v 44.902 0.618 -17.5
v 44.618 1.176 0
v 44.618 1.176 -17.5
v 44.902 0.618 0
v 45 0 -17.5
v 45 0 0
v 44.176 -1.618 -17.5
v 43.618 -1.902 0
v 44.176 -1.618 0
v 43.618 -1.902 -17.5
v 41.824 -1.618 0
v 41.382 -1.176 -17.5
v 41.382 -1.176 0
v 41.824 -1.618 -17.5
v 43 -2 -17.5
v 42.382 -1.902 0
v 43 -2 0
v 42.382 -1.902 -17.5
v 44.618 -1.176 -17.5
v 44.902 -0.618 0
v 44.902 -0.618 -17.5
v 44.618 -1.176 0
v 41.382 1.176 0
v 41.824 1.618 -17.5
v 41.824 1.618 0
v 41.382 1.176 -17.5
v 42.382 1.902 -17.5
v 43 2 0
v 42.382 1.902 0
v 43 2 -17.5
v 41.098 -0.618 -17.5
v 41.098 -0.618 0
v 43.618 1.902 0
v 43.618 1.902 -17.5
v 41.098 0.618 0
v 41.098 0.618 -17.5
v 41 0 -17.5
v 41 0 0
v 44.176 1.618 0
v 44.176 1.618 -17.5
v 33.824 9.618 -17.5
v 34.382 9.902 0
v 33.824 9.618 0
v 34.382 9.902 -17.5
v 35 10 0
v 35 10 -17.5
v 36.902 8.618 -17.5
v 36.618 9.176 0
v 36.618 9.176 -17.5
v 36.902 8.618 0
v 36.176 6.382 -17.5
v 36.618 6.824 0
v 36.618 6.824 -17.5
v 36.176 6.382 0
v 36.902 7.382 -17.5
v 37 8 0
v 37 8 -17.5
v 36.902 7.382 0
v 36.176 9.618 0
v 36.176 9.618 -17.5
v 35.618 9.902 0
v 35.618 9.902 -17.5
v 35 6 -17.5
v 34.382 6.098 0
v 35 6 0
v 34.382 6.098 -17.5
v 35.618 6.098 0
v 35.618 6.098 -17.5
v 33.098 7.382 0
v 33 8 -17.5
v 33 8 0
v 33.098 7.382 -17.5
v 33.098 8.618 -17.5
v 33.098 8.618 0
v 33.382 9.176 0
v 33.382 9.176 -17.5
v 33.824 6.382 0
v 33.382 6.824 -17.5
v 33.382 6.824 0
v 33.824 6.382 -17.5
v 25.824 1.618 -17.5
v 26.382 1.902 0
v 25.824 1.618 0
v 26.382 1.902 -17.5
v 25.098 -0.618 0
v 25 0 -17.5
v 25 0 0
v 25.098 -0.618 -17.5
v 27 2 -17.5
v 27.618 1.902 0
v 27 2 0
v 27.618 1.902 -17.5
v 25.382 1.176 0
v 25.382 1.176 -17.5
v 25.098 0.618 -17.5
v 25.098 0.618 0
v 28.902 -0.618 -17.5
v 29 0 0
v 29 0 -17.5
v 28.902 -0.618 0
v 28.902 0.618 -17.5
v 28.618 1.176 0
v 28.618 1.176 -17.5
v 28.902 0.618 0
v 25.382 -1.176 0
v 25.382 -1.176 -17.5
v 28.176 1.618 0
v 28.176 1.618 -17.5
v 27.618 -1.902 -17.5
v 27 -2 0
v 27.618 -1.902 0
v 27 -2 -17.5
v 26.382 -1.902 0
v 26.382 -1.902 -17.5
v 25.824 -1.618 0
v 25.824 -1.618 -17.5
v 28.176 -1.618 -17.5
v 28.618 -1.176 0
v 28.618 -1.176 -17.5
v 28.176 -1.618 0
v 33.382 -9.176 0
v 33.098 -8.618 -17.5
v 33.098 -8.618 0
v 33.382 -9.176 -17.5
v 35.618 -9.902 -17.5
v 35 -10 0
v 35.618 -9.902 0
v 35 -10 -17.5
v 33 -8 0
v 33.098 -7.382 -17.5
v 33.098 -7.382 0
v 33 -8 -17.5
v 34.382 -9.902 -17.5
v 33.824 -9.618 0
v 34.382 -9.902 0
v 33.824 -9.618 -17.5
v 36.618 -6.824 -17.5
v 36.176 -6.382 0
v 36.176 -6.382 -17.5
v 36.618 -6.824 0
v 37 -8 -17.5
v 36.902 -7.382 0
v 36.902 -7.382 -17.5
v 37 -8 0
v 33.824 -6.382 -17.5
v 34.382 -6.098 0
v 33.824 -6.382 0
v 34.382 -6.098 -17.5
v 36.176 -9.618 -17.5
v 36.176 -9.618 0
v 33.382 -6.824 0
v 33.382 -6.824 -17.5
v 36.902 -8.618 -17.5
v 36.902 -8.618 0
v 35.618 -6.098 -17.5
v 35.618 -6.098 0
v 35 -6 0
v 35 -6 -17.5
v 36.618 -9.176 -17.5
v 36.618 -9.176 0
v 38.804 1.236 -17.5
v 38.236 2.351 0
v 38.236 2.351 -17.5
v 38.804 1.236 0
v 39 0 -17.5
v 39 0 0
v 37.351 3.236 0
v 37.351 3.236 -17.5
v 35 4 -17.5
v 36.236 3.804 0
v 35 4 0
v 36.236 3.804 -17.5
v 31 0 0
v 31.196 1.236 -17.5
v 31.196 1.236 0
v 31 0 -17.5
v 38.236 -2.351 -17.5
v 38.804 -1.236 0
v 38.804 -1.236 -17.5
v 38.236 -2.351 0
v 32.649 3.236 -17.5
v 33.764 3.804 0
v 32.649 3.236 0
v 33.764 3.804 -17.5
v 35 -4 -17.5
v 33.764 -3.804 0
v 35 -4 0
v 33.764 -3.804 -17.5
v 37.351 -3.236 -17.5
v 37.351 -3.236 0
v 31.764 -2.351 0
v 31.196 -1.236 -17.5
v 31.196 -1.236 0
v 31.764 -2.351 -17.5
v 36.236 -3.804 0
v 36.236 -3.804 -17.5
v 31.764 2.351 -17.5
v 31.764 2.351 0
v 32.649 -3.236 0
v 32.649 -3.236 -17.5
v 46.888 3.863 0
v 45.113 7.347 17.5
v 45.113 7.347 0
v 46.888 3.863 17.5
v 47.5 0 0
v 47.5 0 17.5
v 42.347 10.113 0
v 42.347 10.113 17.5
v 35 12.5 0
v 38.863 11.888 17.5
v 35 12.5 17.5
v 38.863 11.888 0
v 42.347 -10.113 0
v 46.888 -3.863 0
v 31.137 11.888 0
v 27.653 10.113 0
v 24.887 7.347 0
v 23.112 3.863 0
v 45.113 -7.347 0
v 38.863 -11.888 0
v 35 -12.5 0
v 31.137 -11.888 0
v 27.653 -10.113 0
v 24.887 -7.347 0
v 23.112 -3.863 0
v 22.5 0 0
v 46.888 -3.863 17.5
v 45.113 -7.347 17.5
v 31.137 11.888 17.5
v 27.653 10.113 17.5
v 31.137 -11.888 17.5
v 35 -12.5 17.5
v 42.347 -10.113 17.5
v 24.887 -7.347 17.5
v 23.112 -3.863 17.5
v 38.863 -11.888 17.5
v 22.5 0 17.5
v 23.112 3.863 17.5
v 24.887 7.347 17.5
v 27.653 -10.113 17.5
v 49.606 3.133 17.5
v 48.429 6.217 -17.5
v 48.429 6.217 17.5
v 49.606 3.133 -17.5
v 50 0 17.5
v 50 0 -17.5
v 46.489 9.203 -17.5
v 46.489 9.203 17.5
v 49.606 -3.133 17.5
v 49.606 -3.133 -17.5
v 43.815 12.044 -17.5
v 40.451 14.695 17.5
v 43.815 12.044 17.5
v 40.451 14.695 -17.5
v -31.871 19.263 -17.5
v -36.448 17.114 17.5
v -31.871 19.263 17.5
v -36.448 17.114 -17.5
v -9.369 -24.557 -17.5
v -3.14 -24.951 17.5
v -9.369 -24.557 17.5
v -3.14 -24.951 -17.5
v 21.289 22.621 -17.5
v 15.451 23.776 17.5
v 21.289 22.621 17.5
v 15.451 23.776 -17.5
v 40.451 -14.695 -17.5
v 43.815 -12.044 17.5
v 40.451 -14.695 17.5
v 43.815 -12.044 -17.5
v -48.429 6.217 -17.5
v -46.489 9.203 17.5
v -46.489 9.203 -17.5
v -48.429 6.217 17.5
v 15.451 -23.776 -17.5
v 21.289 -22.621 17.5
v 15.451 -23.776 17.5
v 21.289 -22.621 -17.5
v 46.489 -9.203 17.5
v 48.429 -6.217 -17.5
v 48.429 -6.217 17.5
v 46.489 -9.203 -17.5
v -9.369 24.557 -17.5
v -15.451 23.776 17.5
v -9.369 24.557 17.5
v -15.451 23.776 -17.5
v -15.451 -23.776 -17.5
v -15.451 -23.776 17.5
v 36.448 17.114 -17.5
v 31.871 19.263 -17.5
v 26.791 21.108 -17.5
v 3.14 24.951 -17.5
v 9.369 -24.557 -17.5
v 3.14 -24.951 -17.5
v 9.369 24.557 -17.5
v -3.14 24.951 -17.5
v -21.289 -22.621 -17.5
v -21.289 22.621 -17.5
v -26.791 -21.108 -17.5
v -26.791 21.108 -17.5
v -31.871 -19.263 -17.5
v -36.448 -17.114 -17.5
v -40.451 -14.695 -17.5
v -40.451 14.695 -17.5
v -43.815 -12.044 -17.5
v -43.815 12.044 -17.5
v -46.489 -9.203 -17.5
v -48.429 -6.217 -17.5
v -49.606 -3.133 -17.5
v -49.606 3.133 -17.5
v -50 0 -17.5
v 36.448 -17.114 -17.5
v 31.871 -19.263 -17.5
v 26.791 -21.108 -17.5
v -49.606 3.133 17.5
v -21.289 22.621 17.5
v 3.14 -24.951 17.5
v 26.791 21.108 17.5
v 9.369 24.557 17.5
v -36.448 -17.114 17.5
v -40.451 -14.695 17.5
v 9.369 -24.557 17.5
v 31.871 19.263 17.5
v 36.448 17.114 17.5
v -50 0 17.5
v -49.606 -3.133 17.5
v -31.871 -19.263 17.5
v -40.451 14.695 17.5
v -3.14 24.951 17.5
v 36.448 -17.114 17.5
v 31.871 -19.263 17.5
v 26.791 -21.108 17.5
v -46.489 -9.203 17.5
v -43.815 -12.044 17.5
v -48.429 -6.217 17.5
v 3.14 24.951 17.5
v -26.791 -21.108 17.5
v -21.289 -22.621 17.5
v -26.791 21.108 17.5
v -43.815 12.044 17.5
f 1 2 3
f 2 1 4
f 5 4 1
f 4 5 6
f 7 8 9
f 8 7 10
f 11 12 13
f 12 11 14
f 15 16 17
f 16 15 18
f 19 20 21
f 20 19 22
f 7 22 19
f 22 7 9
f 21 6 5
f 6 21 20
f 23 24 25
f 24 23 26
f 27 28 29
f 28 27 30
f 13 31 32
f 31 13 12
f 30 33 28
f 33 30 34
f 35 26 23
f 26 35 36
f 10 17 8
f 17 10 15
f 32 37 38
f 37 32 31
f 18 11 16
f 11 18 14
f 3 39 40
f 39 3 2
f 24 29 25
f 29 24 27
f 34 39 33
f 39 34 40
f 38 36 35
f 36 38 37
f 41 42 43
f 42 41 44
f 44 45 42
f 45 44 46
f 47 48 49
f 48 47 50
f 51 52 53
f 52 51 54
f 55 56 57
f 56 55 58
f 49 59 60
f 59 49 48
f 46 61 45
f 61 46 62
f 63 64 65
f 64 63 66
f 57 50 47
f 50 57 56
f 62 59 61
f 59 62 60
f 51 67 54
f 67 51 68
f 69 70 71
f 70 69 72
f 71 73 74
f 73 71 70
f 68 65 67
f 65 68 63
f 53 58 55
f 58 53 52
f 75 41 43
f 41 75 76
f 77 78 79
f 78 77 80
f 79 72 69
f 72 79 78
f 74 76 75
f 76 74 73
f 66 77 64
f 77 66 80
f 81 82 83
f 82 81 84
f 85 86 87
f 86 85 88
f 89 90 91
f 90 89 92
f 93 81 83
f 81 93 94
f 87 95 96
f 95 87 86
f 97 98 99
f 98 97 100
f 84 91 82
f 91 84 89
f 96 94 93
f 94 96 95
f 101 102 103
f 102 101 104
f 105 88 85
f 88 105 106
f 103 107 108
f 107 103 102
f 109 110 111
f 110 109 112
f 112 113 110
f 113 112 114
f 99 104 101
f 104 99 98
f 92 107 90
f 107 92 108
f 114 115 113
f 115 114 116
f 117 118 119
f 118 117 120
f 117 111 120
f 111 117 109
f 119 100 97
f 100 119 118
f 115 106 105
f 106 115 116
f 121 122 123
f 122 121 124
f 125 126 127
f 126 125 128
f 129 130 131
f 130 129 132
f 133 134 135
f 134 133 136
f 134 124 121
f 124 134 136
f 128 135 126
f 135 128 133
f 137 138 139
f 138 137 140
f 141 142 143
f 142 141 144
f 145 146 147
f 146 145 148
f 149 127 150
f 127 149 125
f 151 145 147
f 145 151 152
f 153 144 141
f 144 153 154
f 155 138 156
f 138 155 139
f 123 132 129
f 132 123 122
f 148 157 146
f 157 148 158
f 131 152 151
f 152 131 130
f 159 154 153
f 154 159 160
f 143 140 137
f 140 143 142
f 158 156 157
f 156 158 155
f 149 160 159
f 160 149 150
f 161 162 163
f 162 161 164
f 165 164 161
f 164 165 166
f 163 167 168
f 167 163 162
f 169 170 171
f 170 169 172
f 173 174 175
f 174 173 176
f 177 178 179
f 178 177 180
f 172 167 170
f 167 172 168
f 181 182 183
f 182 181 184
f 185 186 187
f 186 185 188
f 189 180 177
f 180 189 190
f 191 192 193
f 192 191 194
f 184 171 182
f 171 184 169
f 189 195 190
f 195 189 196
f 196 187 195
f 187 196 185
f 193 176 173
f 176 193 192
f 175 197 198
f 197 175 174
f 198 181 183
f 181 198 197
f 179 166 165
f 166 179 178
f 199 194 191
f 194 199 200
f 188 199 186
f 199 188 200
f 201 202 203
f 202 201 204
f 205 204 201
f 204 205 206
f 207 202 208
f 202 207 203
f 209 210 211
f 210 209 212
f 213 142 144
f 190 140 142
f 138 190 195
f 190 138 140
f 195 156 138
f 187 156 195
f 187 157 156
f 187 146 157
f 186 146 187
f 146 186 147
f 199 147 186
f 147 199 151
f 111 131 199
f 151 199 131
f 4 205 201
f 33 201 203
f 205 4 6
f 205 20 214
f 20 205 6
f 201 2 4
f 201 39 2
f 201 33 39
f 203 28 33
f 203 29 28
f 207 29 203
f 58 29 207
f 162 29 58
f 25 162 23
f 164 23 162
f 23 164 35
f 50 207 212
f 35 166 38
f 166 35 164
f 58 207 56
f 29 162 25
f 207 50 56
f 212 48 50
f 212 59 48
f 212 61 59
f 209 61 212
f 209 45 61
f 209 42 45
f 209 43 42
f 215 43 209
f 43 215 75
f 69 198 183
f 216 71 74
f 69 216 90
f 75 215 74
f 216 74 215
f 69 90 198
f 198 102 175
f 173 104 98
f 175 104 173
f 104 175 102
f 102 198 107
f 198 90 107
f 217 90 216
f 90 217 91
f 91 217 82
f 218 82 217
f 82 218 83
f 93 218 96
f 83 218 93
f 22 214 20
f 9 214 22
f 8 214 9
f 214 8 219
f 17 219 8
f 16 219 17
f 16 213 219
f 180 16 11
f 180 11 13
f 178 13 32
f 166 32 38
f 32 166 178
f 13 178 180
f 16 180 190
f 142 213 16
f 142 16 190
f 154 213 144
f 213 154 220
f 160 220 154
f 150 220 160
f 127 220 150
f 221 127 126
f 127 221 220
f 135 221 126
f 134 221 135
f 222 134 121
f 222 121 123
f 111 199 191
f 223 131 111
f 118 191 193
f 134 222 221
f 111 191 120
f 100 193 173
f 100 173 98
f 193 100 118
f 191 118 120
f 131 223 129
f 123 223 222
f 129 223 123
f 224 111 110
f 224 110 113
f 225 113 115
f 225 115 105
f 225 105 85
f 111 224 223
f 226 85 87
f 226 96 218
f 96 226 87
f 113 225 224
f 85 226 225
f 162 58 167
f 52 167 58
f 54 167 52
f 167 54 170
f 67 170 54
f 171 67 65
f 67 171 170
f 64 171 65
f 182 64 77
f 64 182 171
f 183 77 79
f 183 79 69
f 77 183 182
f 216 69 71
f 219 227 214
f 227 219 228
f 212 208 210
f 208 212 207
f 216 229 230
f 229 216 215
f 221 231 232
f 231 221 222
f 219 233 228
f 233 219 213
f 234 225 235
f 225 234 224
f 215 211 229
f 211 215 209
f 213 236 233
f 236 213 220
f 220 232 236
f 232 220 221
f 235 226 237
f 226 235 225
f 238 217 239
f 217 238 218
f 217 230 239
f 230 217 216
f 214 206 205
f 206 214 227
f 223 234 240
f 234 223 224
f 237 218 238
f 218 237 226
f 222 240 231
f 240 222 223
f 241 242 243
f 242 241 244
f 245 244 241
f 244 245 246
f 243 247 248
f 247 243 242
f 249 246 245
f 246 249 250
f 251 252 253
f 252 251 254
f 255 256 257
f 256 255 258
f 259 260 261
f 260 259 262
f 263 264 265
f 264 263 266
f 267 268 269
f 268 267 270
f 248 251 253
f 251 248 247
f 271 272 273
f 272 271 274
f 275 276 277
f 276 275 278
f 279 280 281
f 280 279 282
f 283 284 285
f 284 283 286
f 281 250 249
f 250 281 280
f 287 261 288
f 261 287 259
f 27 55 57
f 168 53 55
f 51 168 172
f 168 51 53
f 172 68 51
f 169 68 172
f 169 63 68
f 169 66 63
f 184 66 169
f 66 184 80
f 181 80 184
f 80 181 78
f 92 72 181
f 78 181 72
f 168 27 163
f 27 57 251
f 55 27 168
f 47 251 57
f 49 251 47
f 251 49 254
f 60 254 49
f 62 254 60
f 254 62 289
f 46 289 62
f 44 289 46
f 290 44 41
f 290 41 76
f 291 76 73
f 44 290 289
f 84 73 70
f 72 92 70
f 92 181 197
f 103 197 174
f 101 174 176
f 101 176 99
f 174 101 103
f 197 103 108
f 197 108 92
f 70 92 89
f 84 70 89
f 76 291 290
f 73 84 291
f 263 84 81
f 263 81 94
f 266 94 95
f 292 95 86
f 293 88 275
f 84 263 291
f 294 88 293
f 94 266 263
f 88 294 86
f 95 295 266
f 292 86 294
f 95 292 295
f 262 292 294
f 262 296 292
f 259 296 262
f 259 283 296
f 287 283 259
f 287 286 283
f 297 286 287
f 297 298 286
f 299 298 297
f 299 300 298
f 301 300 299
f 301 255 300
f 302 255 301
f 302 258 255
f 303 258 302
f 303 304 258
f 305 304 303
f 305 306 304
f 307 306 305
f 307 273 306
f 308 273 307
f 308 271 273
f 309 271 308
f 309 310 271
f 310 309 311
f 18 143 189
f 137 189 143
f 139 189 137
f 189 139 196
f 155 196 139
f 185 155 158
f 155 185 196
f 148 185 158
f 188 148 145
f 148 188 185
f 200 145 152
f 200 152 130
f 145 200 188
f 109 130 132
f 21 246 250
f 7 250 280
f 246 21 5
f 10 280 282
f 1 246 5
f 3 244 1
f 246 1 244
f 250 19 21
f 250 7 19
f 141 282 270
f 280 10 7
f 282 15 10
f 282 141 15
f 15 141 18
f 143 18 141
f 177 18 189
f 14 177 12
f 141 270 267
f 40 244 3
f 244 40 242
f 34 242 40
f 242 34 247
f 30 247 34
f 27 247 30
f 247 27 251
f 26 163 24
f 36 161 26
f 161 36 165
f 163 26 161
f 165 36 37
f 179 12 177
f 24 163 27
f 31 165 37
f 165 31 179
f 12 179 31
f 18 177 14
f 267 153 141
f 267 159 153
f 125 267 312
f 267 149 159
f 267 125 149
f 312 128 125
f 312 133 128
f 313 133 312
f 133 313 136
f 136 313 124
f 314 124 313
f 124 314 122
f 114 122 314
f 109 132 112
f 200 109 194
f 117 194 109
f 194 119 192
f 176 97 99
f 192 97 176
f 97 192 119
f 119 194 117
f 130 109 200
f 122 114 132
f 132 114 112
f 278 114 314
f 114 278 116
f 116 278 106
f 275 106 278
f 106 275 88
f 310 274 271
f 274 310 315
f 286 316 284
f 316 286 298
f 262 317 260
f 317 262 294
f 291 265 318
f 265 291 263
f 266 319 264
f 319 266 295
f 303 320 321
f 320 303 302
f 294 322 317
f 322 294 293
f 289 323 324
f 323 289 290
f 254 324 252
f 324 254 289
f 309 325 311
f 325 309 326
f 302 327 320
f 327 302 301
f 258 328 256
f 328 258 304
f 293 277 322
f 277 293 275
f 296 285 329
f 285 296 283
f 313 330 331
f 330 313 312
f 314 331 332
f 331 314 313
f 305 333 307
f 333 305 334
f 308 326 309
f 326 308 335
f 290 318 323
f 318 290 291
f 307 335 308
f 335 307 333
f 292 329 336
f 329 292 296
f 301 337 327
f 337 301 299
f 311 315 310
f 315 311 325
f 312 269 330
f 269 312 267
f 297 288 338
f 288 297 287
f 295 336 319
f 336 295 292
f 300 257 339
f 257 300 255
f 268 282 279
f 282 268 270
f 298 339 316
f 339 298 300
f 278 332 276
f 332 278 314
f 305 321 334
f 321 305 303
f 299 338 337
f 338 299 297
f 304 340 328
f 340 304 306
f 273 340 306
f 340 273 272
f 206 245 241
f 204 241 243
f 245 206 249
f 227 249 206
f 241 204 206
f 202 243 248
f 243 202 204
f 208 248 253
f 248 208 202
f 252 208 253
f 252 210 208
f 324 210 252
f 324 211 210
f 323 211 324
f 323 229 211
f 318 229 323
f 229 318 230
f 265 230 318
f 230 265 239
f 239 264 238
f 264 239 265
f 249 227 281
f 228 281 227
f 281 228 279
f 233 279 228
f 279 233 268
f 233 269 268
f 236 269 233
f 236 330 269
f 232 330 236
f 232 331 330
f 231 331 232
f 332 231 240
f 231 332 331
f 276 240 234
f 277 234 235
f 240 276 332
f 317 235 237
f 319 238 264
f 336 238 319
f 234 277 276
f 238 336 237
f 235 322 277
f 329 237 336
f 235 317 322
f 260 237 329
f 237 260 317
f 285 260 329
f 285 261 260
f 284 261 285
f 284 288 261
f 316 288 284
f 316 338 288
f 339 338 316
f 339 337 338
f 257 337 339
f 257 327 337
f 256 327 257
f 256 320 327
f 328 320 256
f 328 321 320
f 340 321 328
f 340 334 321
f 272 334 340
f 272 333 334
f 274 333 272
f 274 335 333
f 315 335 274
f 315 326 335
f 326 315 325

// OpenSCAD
//Alissa Jurisch
//Cam for FTC robot
//1-12-18
//Rev 2

//radius 1
radius_large = 50;
//radius 2
radius_small = 25;
//width of cam
cam_width = 35;
//offset of bolt pattern from center radius 
offset = 20;
//depth of cutout
cutout = 20;



//creates screw hole
module screw_hole(){
translate([8,0,-32.5]){
    cylinder(d=4,h=65, $fn=20);
}
}
//creates oval for cam
module oval(w,h, height, center = false,$fn=50) {
 scale([1, h/w, 1]) cylinder(h=height, r=w, center=center);
}
//creates hub hole
module hub(){
    translate ([0,0,-32.5]) {
    cylinder(d=8, h=65, $fn=20);
}
}
//creates whole flower, chose 45 for 8 holes, 90 for 4 holes
module flower(){
for (i=[0 :90: 360])
    rotate(i,[0,0,1]){
screw_hole();
    }
    
hub();    
}
//creates pulley without holes and only one side
module pulley(){
    cylinder (d=50,h=35, $fn=50, center=true);
translate([0,0,-19]){
    cylinder (d=60,h=3, $fn=50, center=true);
}}
//creates holes in pulley
difference(){
//pulley();
  oval(radius_large,radius_small,cam_width,$fn=50, center=true);  
    translate([15+offset,0,0]){
        cylinder(d=25,h=cutout, $fn=20);
            flower();
    }
}
